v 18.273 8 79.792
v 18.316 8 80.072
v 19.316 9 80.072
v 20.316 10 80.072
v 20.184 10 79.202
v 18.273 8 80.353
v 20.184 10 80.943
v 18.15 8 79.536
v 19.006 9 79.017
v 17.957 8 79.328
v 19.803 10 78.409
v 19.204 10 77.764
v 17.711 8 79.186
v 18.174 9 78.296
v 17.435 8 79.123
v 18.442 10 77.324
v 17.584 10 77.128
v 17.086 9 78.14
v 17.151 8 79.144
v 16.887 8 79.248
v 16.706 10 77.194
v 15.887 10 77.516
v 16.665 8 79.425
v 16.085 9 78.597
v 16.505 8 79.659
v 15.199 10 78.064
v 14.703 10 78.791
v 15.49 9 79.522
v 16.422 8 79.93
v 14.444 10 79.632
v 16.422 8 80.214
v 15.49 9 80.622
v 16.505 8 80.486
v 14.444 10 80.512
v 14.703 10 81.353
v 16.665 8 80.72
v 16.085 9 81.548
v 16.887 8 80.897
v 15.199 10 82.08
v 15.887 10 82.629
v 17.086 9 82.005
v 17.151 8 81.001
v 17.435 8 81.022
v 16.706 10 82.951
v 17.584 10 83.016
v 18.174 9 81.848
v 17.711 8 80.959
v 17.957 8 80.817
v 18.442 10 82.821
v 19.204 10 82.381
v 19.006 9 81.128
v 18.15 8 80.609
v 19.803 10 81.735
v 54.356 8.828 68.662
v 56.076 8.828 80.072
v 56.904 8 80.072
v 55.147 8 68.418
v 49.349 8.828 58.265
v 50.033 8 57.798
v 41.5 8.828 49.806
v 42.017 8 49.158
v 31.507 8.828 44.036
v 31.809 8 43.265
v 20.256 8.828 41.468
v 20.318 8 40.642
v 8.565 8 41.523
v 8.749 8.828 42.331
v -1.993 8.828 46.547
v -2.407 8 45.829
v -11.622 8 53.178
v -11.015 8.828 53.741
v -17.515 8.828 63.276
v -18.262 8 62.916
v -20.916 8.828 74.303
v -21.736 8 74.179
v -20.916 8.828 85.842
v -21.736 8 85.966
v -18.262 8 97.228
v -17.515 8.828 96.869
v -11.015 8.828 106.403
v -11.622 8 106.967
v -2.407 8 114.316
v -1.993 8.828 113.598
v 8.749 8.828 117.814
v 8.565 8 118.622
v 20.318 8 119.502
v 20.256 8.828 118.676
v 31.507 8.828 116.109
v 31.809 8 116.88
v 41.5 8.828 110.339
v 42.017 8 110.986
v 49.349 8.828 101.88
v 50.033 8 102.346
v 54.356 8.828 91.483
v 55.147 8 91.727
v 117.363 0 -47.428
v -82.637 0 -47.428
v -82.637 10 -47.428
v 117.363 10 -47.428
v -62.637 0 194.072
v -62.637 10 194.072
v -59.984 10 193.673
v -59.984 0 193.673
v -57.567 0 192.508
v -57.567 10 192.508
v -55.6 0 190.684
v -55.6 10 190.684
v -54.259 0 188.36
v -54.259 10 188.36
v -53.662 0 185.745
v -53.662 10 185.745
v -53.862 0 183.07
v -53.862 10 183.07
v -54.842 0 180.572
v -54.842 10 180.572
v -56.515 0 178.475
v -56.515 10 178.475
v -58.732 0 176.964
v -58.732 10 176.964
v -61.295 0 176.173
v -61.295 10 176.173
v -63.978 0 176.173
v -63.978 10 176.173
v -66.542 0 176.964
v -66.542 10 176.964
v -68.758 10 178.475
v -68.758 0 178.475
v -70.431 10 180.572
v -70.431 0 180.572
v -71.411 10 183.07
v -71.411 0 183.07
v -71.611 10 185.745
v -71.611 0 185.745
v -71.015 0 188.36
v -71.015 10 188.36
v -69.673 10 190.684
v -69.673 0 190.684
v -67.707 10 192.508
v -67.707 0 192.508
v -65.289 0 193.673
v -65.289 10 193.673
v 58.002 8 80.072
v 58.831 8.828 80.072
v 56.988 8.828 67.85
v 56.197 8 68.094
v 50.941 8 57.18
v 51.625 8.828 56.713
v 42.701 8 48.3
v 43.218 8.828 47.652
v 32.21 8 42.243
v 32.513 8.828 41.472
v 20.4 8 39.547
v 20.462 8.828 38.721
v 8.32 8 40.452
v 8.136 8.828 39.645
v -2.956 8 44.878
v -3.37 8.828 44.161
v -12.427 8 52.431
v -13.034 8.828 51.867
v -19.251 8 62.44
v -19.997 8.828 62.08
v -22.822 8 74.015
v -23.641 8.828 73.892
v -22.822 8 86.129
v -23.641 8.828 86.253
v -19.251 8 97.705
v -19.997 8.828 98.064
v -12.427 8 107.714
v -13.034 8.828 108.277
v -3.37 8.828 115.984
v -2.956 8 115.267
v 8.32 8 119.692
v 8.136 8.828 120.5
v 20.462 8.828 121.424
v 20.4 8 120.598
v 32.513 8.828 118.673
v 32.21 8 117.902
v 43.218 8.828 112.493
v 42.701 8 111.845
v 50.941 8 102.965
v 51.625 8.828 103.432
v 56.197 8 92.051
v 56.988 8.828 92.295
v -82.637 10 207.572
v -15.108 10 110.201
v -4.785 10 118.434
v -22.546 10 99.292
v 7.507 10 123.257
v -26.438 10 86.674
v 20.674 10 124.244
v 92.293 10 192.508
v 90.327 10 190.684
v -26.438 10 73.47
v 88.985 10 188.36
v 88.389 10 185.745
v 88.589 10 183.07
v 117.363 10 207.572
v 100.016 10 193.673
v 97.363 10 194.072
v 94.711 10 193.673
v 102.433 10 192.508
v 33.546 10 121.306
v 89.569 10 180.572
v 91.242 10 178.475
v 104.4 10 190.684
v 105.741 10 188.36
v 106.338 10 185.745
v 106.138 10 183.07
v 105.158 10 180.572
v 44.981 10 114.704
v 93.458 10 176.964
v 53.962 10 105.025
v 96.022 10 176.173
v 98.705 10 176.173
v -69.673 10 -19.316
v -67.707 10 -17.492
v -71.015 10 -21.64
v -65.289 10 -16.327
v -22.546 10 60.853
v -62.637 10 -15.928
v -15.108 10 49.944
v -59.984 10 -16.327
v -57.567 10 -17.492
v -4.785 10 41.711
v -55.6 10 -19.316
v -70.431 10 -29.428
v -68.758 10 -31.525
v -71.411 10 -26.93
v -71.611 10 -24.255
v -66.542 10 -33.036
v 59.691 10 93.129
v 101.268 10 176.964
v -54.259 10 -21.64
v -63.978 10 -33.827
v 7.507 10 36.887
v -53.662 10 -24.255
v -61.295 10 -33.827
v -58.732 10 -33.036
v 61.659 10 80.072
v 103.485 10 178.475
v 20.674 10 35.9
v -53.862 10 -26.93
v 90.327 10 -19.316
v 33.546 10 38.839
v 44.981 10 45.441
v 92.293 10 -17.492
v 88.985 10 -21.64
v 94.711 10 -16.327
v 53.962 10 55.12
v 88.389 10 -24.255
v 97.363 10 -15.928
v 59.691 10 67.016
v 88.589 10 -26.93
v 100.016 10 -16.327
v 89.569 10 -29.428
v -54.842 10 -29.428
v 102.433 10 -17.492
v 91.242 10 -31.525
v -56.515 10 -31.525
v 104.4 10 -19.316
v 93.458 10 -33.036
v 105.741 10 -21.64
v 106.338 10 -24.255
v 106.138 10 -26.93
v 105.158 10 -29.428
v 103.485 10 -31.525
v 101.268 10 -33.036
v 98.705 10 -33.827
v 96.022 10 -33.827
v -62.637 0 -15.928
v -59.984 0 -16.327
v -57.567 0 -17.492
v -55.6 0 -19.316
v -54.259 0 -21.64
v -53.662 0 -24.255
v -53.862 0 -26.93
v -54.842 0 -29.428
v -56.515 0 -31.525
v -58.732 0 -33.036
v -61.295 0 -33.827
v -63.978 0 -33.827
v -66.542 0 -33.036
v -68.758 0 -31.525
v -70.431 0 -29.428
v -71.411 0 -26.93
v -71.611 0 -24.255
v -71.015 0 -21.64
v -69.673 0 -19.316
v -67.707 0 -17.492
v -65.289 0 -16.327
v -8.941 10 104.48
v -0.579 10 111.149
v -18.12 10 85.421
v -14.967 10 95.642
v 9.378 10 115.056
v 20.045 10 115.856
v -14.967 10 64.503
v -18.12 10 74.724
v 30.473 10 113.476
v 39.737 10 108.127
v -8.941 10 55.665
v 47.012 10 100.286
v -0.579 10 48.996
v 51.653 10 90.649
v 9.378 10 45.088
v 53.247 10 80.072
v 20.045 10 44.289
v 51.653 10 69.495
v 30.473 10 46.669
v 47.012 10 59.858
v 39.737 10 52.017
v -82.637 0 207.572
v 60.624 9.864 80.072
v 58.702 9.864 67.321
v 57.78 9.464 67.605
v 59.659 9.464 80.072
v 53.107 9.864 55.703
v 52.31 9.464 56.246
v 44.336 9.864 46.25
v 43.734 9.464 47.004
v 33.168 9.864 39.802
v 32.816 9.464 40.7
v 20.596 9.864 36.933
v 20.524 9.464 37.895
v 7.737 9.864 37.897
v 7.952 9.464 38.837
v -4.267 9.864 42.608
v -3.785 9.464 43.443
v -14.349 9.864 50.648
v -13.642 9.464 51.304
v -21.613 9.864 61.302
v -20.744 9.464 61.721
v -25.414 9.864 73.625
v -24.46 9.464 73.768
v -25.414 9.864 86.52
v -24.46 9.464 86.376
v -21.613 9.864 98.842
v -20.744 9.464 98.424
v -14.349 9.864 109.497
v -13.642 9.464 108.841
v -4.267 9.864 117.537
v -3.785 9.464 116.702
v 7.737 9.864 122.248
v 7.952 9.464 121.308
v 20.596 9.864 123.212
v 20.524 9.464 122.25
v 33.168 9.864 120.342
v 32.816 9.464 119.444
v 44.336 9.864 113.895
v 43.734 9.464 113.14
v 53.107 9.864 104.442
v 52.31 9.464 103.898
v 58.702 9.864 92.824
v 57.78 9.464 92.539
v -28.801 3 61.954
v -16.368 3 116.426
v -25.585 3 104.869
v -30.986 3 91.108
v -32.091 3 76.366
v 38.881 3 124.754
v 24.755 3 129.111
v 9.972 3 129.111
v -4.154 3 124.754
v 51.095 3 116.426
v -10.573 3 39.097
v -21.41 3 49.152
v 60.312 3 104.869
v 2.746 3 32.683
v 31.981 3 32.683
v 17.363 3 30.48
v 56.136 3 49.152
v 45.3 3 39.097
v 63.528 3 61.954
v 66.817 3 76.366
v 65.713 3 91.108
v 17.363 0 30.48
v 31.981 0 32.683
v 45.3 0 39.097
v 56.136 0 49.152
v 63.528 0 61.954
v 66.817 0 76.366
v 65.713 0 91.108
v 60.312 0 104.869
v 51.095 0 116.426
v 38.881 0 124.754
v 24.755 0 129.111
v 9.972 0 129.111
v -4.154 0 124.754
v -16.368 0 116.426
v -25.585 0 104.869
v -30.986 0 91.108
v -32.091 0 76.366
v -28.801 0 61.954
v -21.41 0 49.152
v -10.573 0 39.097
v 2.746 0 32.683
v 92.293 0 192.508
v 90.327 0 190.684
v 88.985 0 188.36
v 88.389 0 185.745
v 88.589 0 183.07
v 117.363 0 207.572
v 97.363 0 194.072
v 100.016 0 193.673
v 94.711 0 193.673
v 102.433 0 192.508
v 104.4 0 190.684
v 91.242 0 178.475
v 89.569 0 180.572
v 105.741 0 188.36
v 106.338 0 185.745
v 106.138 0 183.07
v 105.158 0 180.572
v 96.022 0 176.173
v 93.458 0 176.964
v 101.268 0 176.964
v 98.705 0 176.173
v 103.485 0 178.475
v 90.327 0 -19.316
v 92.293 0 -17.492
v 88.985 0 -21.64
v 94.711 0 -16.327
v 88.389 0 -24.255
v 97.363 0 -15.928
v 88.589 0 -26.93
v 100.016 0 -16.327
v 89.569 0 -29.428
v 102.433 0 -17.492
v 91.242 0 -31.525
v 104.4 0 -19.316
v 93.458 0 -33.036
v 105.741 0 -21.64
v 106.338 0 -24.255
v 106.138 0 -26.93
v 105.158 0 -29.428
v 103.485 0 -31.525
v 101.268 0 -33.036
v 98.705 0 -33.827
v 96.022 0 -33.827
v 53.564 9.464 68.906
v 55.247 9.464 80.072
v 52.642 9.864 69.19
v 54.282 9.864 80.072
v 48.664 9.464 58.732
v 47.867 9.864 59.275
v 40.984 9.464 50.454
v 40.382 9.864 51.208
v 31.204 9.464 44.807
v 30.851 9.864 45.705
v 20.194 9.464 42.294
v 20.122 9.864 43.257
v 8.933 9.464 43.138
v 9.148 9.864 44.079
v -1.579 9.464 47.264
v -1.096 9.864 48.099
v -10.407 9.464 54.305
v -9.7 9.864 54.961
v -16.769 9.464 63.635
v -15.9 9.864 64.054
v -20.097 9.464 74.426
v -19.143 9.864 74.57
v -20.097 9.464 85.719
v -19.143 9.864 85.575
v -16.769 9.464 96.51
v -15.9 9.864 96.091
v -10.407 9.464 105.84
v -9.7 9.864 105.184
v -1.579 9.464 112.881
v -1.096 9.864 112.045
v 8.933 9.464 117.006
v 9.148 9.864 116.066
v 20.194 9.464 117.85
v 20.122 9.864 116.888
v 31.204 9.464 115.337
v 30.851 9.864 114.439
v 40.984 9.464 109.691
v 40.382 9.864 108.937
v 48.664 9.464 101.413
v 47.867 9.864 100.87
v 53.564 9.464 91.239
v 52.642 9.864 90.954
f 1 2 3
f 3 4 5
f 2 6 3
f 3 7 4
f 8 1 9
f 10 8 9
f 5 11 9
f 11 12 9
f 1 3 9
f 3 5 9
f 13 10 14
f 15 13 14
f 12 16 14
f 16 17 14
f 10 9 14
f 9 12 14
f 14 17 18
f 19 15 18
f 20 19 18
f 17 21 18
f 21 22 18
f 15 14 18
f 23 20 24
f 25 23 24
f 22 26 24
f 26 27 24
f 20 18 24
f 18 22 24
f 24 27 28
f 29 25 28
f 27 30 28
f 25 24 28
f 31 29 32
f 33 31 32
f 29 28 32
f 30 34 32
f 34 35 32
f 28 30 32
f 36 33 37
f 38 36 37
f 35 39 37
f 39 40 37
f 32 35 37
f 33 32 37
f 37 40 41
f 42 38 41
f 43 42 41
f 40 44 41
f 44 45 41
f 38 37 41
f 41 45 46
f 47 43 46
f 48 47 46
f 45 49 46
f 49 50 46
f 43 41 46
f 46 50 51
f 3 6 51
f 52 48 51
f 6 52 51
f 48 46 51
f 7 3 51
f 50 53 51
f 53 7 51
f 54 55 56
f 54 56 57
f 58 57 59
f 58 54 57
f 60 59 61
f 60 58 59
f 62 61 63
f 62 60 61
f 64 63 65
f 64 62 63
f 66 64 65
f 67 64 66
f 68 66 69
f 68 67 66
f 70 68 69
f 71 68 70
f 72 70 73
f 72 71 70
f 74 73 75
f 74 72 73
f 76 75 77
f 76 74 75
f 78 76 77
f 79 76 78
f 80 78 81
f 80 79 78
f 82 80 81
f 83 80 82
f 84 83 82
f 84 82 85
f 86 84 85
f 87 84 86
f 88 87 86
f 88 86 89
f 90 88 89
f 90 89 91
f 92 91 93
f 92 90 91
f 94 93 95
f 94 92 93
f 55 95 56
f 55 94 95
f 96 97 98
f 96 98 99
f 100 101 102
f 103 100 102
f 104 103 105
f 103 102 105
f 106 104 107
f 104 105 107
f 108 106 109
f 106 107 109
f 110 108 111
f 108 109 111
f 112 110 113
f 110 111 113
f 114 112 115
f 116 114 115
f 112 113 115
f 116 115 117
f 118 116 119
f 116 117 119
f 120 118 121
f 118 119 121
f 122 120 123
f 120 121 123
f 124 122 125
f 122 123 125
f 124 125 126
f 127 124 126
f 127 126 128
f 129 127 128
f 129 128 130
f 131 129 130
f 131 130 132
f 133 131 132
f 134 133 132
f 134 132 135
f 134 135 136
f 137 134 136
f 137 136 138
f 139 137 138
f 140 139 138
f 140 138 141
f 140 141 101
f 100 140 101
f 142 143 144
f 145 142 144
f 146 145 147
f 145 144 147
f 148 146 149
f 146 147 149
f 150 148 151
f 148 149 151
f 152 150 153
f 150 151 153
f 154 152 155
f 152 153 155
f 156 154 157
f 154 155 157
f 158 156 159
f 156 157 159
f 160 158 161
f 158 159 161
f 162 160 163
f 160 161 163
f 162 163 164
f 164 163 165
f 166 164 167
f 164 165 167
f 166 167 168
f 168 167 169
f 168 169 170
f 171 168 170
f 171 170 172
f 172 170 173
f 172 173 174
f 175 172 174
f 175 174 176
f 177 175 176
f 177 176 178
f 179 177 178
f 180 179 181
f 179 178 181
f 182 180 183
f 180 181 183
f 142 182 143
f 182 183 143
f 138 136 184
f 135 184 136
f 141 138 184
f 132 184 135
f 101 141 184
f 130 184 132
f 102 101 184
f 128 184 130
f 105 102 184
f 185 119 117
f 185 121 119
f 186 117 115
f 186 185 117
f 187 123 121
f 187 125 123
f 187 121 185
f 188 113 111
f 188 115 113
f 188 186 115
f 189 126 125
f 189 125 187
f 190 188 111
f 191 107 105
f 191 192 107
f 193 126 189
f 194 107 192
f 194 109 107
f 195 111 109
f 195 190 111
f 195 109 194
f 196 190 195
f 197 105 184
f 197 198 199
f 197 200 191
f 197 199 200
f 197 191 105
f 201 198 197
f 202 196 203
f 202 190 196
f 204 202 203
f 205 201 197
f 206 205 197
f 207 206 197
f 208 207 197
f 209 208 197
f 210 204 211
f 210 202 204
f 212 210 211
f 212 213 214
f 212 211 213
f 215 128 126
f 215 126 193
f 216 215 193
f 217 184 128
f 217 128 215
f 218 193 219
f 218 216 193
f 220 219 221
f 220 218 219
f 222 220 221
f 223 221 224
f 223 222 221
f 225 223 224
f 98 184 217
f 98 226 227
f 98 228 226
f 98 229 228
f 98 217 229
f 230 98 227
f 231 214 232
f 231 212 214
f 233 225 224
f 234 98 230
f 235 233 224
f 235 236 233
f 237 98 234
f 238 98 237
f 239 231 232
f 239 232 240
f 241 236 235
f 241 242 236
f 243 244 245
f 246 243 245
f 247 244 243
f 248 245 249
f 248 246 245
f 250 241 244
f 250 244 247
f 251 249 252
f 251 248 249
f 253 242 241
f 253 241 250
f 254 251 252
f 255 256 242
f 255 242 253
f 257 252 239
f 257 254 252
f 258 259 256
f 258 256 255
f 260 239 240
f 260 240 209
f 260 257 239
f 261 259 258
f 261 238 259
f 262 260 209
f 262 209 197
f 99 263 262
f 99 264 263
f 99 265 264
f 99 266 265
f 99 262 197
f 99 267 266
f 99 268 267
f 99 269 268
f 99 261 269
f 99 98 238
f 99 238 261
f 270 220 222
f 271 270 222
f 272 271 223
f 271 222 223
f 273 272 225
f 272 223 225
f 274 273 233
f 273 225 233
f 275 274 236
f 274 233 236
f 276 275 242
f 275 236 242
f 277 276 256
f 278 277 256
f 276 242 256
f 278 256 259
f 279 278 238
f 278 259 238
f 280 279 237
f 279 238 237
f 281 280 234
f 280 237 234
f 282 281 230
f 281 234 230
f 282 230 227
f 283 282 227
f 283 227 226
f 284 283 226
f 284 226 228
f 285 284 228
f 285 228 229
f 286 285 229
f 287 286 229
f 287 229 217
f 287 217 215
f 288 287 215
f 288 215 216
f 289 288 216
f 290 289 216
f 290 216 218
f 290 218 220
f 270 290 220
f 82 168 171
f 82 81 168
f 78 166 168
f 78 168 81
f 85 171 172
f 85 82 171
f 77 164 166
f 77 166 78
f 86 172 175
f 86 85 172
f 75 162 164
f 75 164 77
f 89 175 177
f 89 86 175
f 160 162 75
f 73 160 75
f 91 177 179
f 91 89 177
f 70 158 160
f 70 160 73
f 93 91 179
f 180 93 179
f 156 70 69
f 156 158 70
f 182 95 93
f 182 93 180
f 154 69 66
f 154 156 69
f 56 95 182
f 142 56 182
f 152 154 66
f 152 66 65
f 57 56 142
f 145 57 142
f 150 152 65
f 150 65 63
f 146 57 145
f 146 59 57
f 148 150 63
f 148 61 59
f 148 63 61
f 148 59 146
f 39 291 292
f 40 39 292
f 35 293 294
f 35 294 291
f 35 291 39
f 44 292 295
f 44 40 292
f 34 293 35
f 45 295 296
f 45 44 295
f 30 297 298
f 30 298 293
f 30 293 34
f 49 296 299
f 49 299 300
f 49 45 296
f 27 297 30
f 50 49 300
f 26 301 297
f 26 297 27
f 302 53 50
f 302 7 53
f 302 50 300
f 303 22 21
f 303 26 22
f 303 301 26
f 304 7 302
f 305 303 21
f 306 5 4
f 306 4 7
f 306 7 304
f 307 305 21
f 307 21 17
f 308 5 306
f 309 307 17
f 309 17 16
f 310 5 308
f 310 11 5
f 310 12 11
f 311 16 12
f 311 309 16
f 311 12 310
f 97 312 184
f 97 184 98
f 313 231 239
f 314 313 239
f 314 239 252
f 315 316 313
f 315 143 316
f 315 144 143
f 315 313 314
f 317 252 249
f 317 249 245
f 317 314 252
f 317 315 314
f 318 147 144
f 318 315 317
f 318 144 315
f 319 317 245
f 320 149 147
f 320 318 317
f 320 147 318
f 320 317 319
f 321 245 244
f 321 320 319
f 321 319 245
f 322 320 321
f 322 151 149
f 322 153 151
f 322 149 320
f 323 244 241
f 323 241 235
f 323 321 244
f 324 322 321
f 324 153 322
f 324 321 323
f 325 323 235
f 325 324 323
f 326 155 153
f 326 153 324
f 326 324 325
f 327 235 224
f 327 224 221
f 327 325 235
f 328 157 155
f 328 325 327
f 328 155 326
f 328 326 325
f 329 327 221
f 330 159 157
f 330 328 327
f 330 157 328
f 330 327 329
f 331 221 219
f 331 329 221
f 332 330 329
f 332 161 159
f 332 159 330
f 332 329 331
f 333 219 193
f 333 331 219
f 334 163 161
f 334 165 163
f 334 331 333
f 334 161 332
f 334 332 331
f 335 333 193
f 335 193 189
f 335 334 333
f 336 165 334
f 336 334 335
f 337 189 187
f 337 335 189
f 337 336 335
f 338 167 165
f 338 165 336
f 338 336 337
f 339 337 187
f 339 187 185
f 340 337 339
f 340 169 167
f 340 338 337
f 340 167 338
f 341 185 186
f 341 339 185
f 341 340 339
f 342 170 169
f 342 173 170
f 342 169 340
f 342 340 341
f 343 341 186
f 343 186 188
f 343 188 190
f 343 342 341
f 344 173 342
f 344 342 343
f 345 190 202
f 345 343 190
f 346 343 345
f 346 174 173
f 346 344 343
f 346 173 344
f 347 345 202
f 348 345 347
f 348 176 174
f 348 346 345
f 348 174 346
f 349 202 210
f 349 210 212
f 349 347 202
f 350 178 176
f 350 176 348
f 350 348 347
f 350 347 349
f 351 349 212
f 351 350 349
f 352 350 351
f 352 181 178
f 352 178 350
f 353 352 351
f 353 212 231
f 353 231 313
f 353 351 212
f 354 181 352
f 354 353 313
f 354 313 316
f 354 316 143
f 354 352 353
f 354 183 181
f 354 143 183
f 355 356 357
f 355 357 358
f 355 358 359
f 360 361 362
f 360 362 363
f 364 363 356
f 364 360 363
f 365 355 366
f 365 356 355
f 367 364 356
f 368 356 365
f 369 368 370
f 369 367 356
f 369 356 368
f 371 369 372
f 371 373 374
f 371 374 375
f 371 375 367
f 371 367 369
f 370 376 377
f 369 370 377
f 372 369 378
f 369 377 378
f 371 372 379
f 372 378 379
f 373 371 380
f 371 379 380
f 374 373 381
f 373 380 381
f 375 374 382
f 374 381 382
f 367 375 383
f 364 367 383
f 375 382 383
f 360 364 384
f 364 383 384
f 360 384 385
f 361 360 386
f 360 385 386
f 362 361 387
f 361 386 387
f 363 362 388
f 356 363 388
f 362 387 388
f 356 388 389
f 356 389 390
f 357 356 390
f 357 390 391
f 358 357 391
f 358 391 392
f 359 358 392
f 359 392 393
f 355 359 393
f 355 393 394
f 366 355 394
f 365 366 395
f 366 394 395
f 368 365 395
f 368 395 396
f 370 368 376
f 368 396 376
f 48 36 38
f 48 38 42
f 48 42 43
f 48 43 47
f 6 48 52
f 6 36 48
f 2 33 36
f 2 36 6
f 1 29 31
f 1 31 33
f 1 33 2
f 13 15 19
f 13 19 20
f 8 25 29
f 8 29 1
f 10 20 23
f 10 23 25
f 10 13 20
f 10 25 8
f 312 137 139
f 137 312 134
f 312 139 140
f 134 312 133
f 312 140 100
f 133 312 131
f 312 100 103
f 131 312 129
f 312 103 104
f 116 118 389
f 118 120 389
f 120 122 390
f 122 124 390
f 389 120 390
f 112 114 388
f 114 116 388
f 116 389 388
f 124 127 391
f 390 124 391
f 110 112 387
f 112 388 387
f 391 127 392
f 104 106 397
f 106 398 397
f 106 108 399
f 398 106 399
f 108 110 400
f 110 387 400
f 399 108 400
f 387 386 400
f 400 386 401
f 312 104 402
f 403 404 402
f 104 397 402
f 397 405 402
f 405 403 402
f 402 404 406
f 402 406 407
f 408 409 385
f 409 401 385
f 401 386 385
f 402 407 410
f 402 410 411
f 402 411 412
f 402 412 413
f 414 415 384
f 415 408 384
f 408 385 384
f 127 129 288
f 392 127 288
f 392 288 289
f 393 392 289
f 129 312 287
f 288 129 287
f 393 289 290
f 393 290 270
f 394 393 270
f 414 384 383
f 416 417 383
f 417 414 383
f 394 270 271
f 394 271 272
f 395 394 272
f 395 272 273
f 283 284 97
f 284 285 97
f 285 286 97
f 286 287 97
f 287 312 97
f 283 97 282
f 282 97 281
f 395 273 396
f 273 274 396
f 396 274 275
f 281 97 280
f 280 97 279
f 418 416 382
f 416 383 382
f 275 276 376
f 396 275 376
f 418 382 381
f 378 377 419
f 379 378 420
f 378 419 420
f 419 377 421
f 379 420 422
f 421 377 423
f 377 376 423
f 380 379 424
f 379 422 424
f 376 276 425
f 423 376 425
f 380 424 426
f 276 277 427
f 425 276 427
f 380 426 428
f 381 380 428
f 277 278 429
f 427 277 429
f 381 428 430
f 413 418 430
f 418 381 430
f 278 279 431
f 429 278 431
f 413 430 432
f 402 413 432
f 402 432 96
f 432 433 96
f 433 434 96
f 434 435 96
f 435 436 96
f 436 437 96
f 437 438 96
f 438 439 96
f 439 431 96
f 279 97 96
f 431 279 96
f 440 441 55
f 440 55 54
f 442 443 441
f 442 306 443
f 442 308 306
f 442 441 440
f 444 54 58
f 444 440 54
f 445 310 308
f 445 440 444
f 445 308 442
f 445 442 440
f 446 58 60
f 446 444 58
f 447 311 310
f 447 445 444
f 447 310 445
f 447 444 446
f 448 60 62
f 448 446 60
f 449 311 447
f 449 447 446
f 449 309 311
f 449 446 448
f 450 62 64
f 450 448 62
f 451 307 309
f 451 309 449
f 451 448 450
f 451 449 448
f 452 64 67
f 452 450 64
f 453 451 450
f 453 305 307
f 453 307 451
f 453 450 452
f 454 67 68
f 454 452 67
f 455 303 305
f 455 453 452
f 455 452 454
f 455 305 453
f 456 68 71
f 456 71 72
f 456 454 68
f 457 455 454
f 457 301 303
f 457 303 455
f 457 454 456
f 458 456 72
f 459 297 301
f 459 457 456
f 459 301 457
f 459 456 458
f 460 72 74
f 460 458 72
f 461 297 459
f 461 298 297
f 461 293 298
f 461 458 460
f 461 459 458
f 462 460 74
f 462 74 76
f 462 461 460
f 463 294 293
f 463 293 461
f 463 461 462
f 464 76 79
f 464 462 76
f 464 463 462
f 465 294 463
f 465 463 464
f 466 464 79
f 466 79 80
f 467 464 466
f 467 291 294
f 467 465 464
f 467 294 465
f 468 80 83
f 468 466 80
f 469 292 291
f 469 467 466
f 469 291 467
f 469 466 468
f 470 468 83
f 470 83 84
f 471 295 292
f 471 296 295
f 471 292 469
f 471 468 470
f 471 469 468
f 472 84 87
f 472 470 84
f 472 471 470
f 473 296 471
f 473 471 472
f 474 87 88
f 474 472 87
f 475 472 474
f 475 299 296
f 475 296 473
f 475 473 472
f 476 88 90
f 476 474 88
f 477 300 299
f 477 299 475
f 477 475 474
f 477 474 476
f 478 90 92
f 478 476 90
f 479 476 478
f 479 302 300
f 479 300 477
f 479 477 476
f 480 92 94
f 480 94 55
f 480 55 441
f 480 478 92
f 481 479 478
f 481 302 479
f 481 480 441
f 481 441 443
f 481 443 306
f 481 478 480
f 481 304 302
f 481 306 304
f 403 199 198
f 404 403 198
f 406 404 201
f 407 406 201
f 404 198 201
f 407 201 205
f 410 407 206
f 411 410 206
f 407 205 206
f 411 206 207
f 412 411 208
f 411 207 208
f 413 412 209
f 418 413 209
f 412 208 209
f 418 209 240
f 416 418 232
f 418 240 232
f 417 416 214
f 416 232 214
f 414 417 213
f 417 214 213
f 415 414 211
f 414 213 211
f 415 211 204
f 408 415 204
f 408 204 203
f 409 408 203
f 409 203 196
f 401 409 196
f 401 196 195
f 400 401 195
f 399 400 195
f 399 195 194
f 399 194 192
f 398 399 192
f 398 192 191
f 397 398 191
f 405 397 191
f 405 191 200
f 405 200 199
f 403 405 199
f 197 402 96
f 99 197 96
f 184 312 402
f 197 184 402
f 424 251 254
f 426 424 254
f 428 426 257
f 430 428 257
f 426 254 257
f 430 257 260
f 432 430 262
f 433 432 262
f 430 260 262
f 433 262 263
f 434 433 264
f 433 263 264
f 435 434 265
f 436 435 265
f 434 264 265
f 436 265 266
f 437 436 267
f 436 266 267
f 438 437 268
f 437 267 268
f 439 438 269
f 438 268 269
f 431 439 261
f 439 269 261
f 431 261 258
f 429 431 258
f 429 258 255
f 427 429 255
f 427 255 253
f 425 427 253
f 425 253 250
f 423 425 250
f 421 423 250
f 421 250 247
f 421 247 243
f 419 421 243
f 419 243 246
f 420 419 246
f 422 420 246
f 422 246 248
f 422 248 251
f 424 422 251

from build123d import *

# Parameters (mm, degrees)
SKETCH1_W           = 200
SKETCH1_H           = 255
BOSS_EXTRUDE1_DEPTH = 10
SKETCH2_R           = 49.592553134
CUT_EXTRUDE1_DEPTH  = 3
SKETCH3_R           = 9
CUT_EXTRUDE2_DEPTH  = 69
SKETCH4_R           = 42.638858135
SKETCH4_R_2         = 37.540647577
CUT_EXTRUDE3_DEPTH  = 2
CUT_EXTRUDE3_DRAFT  = -45
FILLET1_R           = 4
FILLET2_R           = 4
SKETCH5_R           = 2.952313346
CUT_EXTRUDE4_DEPTH  = 2
CUT_EXTRUDE4_DRAFT  = -45


with BuildPart() as part:
    # Sketch1 → Boss-Extrude1 (new body)
    with BuildSketch(Plane(origin=(0, 0, 0), x_dir=(1, 0, 0), z_dir=(0, 1, 0))):
        with Locations((17.363344051, -80.072347267)):
            Rectangle(SKETCH1_W, SKETCH1_H)
    extrude(amount=BOSS_EXTRUDE1_DEPTH)

    # Sketch2 → Cut-Extrude1 (cut)
    with BuildSketch(Plane(origin=(0, 0, 0), x_dir=(-1, 0, 0), z_dir=(0, -1, 0))):
        with Locations(Location((-17.363344051, -80.072347267, 0), (0, 0, 90))):
            Circle(SKETCH2_R)
    extrude(amount=-CUT_EXTRUDE1_DEPTH, mode=Mode.SUBTRACT)

    # Sketch3 → Cut-Extrude2 (cut)
    with BuildSketch(Plane(origin=(0, 10, 0), x_dir=(1, 0, 0), z_dir=(0, 1, 0))):
        with Locations(Location((97.363344051, -185.072347267, 0), (0, 0, 270))):
            Circle(SKETCH3_R)
        with Locations(Location((-62.636655949, 24.927652733, 0), (0, 0, 270))):
            Circle(SKETCH3_R)
        with Locations(Location((-62.636655949, -185.072347267, 0), (0, 0, 270))):
            Circle(SKETCH3_R)
        with Locations(Location((97.363344051, 24.927652733, 0), (0, 0, 270))):
            Circle(SKETCH3_R)
    extrude(amount=-CUT_EXTRUDE2_DEPTH, mode=Mode.SUBTRACT)


with BuildPart() as cut_extrude3_tool:
    # Sketch4 → Cut-Extrude3 (with draft: the straight prism first)
    with BuildSketch(Plane(origin=(0, 10, 0), x_dir=(1, 0, 0), z_dir=(0, 1, 0))):
        with Locations((17.363344051, -80.072347267)):
            Circle(SKETCH4_R)
        with Locations((17.363344051, -80.072347267)):
            Circle(SKETCH4_R_2, mode=Mode.SUBTRACT)
    extrude(amount=-CUT_EXTRUDE3_DEPTH)
    # Cut-Extrude3: the draft: its side faces are tilted about the plane it starts from
    cut_extrude3_sides = [cut_extrude3_tool.faces().sort_by_distance(p)[0] for p in [
        (-25.275514084, 9, 80.072347267),
        (-20.177303525, 9, 80.072347267),
    ]]
    draft(cut_extrude3_sides, Plane(origin=(0, 10, 0), x_dir=(1, 0, 0), z_dir=(0, 1, 0)), CUT_EXTRUDE3_DRAFT)


with BuildPart() as part_1:
    add(part.part)

    # Cut-Extrude3: cut by cut_extrude3_tool
    add(cut_extrude3_tool.part, mode=Mode.SUBTRACT)

    # Fillet1
    fillet1_edges = [part_1.edges().sort_by_distance(p)[0] for p in [
        (-25.275514084, 10, 80.072347267),
    ]]
    fillet(fillet1_edges, radius=FILLET1_R)

    # Fillet2
    fillet2_edges = [part_1.edges().sort_by_distance(p)[0] for p in [
        (-20.177303525, 10, 80.072347267),
    ]]
    fillet(fillet2_edges, radius=FILLET2_R)


with BuildPart() as cut_extrude4_tool:
    # Sketch5 → Cut-Extrude4 (with draft: the straight prism first)
    with BuildSketch(Plane(origin=(0, 10, 0), x_dir=(1, 0, 0), z_dir=(0, 1, 0))):
        with Locations((17.363344051, -80.072347267)):
            Circle(SKETCH5_R)
    extrude(amount=-CUT_EXTRUDE4_DEPTH)
    # Cut-Extrude4: the draft: its side faces are tilted about the plane it starts from
    cut_extrude4_sides = [cut_extrude4_tool.faces().sort_by_distance(p)[0] for p in [
        (14.411030705, 9, 80.072347267),
    ]]
    draft(cut_extrude4_sides, Plane(origin=(0, 10, 0), x_dir=(1, 0, 0), z_dir=(0, 1, 0)), CUT_EXTRUDE4_DRAFT)


with BuildPart() as part_2:
    add(part_1.part)

    # Cut-Extrude4: cut by cut_extrude4_tool
    add(cut_extrude4_tool.part, mode=Mode.SUBTRACT)


solid = part_2.part
